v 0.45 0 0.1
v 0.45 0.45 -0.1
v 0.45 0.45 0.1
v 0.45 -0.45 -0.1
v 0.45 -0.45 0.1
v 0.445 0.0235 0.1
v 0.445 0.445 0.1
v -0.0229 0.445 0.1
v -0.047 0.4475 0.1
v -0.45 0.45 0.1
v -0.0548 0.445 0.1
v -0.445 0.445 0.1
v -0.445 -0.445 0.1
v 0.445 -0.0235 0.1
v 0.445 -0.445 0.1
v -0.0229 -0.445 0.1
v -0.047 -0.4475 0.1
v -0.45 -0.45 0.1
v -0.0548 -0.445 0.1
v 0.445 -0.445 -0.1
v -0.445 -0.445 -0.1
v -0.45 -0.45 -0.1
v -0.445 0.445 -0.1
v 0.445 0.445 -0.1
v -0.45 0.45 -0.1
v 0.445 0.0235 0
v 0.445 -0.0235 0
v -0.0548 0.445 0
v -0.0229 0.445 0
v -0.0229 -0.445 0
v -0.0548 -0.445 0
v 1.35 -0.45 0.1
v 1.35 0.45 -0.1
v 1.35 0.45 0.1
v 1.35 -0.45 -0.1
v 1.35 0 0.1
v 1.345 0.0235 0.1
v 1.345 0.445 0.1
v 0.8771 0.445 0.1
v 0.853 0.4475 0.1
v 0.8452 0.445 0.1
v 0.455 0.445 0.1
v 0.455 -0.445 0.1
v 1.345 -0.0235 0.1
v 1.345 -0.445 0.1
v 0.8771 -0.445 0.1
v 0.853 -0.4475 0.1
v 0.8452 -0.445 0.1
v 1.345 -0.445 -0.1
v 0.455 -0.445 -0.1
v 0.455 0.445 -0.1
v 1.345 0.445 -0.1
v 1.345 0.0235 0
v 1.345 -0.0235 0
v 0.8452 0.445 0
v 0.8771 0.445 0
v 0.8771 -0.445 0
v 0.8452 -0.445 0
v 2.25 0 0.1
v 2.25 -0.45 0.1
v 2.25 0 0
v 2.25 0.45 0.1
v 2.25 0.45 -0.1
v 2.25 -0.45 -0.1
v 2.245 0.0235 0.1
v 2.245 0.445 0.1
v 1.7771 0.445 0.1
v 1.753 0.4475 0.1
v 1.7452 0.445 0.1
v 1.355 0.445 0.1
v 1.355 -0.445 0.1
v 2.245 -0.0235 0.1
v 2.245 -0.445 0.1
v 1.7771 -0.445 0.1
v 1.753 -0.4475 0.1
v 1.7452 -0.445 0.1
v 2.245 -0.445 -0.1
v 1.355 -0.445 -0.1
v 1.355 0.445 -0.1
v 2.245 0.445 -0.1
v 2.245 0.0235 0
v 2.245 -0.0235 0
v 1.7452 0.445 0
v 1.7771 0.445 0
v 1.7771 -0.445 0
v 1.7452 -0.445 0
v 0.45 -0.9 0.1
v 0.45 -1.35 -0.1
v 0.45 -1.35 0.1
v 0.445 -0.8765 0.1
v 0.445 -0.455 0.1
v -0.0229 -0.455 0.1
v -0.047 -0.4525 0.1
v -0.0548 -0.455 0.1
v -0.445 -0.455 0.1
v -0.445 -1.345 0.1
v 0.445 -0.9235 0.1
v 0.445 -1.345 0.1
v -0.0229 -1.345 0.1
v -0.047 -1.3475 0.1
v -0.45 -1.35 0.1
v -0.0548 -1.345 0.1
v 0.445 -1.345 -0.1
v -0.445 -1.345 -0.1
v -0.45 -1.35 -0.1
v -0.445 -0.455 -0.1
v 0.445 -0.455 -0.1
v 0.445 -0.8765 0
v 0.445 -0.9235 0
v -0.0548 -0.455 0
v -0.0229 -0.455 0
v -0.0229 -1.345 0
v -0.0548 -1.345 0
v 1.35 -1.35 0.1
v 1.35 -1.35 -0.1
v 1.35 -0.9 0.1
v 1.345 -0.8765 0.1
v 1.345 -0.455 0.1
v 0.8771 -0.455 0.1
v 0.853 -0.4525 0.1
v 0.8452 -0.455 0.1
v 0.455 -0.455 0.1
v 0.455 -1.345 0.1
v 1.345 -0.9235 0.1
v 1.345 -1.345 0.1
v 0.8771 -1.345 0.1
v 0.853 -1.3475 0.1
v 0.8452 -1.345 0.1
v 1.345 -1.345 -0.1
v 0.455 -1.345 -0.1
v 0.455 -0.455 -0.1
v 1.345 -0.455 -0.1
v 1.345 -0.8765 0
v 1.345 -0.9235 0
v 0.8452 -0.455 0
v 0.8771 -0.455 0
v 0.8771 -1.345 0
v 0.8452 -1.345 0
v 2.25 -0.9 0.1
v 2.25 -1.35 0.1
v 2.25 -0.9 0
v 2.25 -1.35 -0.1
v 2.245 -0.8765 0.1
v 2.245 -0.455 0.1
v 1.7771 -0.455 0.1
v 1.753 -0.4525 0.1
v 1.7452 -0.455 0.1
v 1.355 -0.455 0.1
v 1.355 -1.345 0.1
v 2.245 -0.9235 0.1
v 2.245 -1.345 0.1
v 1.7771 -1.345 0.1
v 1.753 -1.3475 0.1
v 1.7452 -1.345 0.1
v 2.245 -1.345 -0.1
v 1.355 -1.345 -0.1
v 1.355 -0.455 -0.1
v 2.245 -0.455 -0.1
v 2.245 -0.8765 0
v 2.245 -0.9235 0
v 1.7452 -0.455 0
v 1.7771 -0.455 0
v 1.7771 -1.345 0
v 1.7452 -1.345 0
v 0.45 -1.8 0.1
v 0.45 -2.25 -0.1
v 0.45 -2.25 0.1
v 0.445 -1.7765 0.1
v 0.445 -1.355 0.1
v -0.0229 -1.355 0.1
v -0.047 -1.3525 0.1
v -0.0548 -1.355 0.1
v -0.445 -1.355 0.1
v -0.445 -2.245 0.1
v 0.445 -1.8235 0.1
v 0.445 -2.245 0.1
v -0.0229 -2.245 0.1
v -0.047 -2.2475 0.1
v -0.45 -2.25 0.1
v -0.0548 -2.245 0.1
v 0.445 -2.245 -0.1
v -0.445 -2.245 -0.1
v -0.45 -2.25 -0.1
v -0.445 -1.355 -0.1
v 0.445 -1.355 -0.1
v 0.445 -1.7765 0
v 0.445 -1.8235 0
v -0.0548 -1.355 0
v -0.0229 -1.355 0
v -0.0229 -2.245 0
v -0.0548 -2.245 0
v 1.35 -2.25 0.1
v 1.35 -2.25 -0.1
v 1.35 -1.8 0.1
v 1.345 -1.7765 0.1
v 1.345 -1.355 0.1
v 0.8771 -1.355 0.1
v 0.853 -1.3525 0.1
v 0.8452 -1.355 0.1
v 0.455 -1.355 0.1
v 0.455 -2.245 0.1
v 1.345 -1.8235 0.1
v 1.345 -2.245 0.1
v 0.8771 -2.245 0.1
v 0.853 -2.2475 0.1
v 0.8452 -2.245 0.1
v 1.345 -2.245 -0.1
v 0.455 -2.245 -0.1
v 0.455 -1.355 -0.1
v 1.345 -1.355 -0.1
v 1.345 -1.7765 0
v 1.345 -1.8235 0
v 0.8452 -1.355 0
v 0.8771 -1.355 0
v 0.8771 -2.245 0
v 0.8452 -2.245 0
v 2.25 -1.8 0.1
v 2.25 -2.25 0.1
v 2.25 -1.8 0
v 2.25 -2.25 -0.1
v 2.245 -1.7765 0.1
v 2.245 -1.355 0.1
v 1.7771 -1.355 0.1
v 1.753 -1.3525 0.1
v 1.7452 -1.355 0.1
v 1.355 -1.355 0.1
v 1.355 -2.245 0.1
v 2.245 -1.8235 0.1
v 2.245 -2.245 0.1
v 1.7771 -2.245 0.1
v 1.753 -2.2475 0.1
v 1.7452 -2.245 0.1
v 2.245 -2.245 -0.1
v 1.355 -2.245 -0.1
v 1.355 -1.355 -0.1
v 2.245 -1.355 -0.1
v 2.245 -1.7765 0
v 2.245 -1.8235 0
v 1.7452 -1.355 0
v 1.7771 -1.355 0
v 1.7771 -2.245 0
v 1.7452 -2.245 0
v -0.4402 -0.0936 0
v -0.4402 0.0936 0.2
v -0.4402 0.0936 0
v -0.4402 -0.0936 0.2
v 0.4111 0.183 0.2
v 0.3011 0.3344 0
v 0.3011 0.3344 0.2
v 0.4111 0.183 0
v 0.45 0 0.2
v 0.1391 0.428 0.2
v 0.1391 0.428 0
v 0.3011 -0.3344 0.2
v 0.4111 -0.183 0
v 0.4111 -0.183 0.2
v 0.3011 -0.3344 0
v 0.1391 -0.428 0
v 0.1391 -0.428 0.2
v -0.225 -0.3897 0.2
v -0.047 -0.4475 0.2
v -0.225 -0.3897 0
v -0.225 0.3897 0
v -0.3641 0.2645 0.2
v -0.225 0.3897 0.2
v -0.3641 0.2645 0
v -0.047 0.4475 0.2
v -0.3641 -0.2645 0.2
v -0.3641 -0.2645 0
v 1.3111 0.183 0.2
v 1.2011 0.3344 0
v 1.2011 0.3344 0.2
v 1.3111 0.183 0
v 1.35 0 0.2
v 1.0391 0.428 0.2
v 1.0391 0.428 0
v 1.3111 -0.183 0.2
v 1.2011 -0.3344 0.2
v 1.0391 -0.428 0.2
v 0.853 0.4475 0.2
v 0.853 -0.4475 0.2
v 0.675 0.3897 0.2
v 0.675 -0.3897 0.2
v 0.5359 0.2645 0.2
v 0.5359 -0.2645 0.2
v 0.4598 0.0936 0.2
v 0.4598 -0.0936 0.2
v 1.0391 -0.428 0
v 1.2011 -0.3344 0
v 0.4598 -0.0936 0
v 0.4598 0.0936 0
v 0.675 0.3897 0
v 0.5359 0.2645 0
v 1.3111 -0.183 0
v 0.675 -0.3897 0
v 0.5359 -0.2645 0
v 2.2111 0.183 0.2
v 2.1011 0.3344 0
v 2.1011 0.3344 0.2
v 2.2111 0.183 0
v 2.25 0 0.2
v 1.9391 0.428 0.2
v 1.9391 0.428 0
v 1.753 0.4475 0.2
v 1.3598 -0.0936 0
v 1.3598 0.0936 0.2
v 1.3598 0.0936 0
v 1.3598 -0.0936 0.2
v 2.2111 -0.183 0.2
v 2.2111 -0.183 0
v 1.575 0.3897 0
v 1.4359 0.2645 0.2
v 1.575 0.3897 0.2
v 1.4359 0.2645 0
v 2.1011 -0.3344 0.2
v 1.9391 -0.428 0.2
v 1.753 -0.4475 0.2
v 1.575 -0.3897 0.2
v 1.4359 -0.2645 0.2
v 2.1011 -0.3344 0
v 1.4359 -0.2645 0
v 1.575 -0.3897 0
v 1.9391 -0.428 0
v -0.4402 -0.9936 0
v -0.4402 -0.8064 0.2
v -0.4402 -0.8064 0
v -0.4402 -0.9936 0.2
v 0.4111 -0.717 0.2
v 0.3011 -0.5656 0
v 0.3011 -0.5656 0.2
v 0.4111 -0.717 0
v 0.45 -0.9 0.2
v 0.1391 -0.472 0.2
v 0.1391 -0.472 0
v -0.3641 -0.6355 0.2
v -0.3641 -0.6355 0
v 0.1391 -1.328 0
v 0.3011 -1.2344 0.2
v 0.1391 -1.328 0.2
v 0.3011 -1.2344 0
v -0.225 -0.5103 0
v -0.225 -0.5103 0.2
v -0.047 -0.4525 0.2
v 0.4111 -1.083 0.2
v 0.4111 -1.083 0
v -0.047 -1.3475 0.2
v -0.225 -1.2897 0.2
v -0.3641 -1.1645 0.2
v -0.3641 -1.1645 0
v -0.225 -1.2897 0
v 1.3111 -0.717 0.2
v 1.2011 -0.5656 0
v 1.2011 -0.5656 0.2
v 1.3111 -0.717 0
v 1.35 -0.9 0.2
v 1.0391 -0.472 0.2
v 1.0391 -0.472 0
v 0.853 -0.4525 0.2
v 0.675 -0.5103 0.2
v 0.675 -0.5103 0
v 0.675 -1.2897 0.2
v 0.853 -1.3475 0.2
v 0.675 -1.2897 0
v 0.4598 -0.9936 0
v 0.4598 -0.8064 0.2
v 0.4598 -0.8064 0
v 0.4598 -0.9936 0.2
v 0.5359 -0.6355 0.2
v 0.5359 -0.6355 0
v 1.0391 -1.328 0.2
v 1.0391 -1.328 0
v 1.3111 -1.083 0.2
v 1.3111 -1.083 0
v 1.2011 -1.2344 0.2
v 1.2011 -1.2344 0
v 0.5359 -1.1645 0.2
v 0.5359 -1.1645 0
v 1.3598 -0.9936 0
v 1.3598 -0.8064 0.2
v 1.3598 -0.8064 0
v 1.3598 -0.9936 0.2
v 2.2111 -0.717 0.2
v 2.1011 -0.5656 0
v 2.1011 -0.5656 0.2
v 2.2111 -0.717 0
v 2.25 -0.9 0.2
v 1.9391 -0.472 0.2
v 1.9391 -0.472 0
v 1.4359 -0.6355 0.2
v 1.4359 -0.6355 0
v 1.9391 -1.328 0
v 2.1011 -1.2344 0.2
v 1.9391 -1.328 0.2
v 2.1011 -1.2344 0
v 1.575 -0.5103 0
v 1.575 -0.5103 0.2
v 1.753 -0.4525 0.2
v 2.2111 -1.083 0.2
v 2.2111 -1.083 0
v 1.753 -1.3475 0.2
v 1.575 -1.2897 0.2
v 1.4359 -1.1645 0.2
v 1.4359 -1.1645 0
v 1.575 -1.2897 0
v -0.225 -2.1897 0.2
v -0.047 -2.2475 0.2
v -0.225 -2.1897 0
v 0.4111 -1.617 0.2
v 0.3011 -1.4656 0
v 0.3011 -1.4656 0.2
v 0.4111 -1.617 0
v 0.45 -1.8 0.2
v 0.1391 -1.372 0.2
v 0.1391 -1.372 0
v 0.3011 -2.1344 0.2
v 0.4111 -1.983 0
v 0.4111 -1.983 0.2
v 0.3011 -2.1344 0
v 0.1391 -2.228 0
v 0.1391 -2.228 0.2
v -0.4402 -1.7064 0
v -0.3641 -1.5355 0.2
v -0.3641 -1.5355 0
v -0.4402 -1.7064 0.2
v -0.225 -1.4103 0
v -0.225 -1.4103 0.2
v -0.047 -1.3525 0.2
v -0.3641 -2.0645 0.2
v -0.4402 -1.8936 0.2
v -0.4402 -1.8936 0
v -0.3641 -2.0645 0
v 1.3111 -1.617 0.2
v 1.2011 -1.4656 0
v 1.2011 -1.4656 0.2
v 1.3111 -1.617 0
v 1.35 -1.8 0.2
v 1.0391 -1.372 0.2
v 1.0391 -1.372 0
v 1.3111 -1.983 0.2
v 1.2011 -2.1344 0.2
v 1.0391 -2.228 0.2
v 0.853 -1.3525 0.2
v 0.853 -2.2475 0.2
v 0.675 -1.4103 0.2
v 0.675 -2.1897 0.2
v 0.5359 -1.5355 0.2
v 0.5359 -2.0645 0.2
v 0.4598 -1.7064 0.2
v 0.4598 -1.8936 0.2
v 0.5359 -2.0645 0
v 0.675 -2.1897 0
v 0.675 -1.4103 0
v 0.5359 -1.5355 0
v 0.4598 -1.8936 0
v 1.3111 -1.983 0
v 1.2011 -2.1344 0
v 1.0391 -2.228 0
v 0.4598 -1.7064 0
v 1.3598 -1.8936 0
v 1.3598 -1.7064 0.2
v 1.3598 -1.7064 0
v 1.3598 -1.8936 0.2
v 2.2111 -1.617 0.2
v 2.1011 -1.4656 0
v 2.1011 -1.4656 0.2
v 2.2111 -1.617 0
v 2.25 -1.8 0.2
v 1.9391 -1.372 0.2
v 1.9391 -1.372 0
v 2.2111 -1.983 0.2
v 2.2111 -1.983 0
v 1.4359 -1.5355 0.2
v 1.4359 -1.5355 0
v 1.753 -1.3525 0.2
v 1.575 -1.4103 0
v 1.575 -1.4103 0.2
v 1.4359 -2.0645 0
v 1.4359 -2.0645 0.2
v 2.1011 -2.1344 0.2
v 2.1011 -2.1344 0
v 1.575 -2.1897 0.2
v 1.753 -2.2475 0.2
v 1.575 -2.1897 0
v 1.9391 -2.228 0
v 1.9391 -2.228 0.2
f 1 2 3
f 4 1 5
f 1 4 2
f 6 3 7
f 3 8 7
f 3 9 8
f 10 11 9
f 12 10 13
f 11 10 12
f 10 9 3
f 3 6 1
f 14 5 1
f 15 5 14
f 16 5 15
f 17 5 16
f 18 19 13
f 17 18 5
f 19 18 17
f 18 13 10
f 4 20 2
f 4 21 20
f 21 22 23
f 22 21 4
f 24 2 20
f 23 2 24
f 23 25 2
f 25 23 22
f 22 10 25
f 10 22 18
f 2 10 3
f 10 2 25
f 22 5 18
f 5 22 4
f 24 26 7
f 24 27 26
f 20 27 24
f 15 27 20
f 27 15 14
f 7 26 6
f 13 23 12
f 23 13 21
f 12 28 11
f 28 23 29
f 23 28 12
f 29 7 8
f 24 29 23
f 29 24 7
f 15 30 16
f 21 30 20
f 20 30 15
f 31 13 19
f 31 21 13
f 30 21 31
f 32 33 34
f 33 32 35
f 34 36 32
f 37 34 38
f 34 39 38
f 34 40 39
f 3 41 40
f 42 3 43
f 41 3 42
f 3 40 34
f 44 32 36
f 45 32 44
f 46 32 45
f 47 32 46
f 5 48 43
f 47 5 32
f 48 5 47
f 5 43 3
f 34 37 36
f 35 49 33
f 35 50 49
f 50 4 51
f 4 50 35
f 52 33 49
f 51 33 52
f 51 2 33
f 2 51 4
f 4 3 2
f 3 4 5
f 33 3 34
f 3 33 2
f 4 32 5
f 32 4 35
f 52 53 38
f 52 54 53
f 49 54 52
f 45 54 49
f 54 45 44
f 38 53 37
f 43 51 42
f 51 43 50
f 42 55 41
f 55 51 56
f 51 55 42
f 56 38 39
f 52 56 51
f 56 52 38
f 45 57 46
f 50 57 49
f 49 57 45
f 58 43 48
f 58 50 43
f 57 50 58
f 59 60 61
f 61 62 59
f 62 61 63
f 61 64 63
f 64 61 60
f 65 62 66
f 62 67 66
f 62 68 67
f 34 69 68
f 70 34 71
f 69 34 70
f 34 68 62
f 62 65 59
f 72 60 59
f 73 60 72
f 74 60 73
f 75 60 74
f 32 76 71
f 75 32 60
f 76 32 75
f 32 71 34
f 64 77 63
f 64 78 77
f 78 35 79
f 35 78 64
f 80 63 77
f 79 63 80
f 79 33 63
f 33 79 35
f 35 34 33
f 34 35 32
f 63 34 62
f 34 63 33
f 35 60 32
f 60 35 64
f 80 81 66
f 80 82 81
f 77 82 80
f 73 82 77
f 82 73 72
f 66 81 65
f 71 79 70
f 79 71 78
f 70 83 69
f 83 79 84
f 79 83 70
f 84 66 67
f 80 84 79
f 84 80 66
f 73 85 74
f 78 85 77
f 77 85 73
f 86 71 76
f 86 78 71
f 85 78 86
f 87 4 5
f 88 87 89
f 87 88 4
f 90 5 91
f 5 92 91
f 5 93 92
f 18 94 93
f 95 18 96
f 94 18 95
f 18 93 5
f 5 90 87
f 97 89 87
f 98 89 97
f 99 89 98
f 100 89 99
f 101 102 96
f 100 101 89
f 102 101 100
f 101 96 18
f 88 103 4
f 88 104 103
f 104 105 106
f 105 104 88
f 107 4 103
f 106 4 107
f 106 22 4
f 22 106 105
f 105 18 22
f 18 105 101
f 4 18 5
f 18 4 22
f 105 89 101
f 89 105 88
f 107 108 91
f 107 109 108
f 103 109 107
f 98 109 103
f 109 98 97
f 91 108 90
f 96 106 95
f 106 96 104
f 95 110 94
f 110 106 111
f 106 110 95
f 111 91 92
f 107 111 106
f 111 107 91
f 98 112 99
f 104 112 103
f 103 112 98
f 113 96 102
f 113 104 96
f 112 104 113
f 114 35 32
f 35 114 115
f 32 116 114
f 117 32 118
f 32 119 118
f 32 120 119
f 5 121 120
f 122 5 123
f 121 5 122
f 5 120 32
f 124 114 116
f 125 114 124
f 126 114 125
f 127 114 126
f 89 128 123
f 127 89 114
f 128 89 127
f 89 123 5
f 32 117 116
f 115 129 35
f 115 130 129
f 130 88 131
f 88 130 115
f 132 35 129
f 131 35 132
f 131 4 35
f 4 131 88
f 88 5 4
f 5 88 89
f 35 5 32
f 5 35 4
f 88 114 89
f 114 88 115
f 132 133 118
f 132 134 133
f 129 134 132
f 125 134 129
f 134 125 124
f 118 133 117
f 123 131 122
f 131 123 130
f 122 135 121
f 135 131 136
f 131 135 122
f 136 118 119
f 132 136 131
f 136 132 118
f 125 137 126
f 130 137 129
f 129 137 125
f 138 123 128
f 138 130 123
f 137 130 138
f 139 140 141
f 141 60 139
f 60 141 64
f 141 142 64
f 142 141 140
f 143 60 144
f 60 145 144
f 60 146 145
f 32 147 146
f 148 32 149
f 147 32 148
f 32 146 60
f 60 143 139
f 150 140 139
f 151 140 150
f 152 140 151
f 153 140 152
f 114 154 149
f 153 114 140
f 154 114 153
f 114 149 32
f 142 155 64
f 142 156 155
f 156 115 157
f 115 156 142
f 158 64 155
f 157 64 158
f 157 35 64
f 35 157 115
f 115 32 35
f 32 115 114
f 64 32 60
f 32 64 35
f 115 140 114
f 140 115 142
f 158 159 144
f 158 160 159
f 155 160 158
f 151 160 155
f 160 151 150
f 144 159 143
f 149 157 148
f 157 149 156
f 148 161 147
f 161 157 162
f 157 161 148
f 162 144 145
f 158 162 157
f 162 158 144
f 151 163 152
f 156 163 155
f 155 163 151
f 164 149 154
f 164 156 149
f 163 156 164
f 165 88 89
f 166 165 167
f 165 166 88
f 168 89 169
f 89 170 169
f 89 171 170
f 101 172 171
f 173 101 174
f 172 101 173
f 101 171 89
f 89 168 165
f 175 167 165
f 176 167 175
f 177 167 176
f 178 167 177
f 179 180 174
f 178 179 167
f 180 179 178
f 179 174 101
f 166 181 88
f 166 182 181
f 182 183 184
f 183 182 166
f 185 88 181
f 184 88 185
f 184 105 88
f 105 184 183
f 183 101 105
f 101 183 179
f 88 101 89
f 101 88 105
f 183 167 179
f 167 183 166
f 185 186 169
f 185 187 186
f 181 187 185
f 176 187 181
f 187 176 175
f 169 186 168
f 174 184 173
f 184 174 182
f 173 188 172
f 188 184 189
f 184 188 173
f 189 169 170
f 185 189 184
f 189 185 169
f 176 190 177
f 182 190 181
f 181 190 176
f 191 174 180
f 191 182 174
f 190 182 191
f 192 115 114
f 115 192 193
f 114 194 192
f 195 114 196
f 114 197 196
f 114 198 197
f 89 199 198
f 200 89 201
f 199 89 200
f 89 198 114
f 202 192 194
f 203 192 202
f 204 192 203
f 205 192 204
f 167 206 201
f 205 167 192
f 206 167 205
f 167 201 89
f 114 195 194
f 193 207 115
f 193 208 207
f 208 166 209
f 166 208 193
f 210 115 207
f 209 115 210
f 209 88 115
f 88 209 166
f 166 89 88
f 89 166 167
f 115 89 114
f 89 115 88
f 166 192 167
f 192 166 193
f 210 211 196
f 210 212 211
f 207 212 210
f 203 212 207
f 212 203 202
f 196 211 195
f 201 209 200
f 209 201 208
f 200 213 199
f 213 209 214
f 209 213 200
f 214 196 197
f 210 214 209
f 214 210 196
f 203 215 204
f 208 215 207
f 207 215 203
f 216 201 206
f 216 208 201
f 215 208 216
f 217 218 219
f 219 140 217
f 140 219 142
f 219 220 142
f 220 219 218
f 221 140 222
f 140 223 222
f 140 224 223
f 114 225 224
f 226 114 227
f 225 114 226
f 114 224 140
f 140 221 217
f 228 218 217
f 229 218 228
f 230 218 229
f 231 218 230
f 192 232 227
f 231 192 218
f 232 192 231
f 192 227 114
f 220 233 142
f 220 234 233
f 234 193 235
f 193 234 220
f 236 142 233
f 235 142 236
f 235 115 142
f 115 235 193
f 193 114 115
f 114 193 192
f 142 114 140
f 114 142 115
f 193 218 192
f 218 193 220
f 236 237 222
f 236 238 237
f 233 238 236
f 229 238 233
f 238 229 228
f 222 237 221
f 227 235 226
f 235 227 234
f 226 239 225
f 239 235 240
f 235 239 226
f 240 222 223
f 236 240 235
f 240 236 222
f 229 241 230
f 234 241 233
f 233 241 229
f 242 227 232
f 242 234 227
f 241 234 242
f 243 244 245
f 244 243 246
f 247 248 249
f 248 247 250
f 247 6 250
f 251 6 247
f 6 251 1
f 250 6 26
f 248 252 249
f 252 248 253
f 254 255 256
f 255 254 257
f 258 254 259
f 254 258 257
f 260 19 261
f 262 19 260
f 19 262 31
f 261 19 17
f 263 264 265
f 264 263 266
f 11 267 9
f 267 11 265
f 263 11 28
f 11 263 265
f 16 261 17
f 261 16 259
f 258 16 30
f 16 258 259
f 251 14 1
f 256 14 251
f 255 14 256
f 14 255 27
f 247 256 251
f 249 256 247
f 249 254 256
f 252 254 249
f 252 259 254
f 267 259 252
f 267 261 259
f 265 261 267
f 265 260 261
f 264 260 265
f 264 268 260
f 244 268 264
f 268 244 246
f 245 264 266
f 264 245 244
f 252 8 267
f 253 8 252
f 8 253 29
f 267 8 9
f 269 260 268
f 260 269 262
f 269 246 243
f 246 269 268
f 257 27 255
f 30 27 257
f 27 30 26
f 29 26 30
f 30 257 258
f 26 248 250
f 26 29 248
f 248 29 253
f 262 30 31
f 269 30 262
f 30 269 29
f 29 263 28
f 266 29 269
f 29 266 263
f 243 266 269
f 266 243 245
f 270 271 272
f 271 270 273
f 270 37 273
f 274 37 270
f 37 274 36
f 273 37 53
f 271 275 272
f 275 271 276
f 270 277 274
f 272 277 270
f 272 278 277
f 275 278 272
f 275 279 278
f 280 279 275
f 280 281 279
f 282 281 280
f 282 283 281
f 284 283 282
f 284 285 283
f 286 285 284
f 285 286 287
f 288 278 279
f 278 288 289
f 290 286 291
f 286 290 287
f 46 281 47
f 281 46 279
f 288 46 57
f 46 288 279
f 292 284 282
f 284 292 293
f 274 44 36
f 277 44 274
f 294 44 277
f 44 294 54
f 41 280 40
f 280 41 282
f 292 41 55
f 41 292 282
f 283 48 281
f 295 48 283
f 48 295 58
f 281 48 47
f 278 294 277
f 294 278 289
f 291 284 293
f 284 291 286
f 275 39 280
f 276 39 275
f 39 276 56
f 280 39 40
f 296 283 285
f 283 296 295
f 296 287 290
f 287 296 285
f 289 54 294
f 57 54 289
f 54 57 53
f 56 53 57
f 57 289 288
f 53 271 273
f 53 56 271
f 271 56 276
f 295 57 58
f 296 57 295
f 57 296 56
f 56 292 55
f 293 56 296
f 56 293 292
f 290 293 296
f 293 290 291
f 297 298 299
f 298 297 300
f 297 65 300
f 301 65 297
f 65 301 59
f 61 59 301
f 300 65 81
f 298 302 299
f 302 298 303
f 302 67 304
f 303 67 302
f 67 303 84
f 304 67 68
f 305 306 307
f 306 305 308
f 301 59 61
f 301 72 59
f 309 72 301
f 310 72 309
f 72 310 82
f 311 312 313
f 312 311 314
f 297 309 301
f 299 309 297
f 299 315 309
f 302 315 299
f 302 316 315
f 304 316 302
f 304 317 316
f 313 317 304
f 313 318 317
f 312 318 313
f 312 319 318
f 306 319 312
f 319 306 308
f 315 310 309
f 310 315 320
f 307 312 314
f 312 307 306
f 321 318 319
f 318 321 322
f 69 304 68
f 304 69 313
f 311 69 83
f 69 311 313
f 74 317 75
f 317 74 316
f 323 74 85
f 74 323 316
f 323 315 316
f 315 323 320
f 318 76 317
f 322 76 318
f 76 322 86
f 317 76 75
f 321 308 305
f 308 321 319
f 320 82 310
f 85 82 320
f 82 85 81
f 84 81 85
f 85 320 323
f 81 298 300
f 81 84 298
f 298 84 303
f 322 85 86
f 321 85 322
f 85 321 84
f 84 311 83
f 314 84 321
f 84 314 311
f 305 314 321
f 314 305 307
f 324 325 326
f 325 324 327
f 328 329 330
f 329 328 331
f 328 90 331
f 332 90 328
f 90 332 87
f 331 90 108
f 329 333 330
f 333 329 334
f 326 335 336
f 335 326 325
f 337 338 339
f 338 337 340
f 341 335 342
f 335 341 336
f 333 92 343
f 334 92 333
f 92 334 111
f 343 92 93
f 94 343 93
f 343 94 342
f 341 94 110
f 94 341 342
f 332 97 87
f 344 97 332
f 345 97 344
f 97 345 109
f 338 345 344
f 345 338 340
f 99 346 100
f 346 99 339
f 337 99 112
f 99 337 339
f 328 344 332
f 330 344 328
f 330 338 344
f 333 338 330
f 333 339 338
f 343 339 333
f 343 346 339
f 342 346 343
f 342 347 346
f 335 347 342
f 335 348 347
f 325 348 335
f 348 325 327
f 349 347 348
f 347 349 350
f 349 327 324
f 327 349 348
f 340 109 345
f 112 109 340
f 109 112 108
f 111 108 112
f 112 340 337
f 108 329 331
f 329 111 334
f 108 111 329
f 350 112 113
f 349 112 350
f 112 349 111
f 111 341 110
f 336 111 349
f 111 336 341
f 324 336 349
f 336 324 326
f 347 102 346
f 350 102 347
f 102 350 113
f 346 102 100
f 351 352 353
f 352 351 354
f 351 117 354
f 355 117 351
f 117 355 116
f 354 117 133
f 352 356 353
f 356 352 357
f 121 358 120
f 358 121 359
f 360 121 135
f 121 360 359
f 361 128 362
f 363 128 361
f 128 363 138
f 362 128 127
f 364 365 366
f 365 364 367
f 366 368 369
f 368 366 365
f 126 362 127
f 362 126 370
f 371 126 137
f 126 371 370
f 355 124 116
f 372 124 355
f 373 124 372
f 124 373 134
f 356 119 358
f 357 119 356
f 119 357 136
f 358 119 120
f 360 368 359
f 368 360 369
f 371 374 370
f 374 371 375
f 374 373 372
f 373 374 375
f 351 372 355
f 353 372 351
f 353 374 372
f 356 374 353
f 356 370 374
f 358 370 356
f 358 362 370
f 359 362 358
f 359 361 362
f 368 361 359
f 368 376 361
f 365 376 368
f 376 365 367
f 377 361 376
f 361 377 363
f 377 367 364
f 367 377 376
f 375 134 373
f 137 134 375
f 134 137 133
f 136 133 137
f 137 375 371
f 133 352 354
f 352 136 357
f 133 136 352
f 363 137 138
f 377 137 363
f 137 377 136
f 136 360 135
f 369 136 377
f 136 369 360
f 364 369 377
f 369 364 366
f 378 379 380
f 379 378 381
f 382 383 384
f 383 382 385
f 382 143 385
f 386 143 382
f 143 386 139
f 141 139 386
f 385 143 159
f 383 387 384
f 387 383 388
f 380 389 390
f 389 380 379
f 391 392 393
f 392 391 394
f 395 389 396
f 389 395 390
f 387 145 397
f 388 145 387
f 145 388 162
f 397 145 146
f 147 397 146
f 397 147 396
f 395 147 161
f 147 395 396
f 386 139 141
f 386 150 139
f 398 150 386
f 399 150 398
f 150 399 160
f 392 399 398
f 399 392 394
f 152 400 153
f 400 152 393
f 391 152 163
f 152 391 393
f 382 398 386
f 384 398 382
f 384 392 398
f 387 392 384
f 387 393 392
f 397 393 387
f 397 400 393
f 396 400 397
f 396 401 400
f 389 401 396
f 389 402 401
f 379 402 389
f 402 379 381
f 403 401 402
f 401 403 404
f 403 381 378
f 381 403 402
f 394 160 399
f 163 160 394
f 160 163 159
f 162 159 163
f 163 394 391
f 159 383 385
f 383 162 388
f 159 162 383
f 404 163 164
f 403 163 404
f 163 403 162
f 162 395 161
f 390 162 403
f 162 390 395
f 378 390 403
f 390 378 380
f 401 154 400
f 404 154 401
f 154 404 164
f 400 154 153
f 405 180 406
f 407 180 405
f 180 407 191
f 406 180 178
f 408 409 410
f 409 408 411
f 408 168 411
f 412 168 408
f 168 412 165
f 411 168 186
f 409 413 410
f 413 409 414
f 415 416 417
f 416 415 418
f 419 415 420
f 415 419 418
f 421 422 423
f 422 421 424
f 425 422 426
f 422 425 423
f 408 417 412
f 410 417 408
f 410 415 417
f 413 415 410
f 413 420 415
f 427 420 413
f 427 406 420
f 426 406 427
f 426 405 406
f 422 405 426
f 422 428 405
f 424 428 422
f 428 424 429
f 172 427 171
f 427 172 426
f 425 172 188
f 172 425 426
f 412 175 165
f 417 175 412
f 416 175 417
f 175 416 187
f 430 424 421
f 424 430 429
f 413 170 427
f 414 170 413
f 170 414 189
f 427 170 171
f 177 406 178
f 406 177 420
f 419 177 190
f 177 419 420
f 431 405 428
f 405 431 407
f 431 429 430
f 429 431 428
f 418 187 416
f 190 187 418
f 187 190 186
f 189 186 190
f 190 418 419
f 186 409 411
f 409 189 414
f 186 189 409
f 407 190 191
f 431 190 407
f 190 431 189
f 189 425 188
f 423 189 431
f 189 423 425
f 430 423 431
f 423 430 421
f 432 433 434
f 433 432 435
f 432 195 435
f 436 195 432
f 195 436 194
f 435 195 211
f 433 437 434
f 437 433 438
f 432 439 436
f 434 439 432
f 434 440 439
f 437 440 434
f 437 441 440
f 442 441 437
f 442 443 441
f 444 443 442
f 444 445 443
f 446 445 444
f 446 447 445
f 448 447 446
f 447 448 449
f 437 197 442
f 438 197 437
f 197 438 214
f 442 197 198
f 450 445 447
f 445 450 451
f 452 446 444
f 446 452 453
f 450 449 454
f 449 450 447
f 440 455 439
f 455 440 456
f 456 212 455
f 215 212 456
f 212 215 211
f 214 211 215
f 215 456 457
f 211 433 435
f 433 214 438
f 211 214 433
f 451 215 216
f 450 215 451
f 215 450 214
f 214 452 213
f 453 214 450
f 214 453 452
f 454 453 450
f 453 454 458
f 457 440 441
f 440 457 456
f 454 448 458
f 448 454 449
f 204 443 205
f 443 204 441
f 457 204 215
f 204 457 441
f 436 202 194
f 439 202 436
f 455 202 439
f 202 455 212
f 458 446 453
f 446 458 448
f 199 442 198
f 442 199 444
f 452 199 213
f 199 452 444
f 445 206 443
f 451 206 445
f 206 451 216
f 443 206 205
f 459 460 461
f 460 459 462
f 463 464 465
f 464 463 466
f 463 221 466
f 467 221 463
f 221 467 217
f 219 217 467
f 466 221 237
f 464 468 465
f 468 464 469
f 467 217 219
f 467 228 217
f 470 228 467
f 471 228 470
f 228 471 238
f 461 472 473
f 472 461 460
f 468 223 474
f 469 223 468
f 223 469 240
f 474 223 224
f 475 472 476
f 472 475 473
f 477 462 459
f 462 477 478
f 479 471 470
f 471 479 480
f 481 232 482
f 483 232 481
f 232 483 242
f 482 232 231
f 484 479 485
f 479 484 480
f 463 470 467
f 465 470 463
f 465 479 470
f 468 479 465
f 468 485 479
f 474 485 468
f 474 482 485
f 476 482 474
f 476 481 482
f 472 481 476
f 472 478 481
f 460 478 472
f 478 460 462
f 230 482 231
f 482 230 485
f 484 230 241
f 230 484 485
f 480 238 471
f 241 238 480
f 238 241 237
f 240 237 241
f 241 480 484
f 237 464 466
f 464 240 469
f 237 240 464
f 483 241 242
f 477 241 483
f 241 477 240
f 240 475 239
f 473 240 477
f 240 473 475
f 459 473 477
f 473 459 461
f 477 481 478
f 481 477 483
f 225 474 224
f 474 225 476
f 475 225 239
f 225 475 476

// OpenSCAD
$fn=15;
gridLength = 2.7;
gridSquares = 3;
oneGridLength = gridLength / gridSquares;
module oneGrid(){
  difference(){
    cube([oneGridLength,oneGridLength,0.2], center = true);
    cube([oneGridLength - 0.01,oneGridLength - 0.01,0.3], center = true);

  }
}

module buildGrid(array){
  for ( row=[0:1:gridSquares - 1]) {
    for ( col=[0:1:gridSquares - 1]) {
      translate([col * oneGridLength,row * -1 * oneGridLength,0])
      oneGrid();
    }
  }
  
  for ( row=[0:1:gridSquares - 1]) {
    for ( col=[0:1:gridSquares - 1]) {
      if(array[row][col] == 1){
        translate([col * oneGridLength,row * -1 * oneGridLength,0])
        cylinder(h=0.2,d=oneGridLength);
      }   
    }
  }
  
    
}

sender_array = [[1,1,1],
                [1,1,1],
                [1,1,1]];

buildGrid(sender_array);
